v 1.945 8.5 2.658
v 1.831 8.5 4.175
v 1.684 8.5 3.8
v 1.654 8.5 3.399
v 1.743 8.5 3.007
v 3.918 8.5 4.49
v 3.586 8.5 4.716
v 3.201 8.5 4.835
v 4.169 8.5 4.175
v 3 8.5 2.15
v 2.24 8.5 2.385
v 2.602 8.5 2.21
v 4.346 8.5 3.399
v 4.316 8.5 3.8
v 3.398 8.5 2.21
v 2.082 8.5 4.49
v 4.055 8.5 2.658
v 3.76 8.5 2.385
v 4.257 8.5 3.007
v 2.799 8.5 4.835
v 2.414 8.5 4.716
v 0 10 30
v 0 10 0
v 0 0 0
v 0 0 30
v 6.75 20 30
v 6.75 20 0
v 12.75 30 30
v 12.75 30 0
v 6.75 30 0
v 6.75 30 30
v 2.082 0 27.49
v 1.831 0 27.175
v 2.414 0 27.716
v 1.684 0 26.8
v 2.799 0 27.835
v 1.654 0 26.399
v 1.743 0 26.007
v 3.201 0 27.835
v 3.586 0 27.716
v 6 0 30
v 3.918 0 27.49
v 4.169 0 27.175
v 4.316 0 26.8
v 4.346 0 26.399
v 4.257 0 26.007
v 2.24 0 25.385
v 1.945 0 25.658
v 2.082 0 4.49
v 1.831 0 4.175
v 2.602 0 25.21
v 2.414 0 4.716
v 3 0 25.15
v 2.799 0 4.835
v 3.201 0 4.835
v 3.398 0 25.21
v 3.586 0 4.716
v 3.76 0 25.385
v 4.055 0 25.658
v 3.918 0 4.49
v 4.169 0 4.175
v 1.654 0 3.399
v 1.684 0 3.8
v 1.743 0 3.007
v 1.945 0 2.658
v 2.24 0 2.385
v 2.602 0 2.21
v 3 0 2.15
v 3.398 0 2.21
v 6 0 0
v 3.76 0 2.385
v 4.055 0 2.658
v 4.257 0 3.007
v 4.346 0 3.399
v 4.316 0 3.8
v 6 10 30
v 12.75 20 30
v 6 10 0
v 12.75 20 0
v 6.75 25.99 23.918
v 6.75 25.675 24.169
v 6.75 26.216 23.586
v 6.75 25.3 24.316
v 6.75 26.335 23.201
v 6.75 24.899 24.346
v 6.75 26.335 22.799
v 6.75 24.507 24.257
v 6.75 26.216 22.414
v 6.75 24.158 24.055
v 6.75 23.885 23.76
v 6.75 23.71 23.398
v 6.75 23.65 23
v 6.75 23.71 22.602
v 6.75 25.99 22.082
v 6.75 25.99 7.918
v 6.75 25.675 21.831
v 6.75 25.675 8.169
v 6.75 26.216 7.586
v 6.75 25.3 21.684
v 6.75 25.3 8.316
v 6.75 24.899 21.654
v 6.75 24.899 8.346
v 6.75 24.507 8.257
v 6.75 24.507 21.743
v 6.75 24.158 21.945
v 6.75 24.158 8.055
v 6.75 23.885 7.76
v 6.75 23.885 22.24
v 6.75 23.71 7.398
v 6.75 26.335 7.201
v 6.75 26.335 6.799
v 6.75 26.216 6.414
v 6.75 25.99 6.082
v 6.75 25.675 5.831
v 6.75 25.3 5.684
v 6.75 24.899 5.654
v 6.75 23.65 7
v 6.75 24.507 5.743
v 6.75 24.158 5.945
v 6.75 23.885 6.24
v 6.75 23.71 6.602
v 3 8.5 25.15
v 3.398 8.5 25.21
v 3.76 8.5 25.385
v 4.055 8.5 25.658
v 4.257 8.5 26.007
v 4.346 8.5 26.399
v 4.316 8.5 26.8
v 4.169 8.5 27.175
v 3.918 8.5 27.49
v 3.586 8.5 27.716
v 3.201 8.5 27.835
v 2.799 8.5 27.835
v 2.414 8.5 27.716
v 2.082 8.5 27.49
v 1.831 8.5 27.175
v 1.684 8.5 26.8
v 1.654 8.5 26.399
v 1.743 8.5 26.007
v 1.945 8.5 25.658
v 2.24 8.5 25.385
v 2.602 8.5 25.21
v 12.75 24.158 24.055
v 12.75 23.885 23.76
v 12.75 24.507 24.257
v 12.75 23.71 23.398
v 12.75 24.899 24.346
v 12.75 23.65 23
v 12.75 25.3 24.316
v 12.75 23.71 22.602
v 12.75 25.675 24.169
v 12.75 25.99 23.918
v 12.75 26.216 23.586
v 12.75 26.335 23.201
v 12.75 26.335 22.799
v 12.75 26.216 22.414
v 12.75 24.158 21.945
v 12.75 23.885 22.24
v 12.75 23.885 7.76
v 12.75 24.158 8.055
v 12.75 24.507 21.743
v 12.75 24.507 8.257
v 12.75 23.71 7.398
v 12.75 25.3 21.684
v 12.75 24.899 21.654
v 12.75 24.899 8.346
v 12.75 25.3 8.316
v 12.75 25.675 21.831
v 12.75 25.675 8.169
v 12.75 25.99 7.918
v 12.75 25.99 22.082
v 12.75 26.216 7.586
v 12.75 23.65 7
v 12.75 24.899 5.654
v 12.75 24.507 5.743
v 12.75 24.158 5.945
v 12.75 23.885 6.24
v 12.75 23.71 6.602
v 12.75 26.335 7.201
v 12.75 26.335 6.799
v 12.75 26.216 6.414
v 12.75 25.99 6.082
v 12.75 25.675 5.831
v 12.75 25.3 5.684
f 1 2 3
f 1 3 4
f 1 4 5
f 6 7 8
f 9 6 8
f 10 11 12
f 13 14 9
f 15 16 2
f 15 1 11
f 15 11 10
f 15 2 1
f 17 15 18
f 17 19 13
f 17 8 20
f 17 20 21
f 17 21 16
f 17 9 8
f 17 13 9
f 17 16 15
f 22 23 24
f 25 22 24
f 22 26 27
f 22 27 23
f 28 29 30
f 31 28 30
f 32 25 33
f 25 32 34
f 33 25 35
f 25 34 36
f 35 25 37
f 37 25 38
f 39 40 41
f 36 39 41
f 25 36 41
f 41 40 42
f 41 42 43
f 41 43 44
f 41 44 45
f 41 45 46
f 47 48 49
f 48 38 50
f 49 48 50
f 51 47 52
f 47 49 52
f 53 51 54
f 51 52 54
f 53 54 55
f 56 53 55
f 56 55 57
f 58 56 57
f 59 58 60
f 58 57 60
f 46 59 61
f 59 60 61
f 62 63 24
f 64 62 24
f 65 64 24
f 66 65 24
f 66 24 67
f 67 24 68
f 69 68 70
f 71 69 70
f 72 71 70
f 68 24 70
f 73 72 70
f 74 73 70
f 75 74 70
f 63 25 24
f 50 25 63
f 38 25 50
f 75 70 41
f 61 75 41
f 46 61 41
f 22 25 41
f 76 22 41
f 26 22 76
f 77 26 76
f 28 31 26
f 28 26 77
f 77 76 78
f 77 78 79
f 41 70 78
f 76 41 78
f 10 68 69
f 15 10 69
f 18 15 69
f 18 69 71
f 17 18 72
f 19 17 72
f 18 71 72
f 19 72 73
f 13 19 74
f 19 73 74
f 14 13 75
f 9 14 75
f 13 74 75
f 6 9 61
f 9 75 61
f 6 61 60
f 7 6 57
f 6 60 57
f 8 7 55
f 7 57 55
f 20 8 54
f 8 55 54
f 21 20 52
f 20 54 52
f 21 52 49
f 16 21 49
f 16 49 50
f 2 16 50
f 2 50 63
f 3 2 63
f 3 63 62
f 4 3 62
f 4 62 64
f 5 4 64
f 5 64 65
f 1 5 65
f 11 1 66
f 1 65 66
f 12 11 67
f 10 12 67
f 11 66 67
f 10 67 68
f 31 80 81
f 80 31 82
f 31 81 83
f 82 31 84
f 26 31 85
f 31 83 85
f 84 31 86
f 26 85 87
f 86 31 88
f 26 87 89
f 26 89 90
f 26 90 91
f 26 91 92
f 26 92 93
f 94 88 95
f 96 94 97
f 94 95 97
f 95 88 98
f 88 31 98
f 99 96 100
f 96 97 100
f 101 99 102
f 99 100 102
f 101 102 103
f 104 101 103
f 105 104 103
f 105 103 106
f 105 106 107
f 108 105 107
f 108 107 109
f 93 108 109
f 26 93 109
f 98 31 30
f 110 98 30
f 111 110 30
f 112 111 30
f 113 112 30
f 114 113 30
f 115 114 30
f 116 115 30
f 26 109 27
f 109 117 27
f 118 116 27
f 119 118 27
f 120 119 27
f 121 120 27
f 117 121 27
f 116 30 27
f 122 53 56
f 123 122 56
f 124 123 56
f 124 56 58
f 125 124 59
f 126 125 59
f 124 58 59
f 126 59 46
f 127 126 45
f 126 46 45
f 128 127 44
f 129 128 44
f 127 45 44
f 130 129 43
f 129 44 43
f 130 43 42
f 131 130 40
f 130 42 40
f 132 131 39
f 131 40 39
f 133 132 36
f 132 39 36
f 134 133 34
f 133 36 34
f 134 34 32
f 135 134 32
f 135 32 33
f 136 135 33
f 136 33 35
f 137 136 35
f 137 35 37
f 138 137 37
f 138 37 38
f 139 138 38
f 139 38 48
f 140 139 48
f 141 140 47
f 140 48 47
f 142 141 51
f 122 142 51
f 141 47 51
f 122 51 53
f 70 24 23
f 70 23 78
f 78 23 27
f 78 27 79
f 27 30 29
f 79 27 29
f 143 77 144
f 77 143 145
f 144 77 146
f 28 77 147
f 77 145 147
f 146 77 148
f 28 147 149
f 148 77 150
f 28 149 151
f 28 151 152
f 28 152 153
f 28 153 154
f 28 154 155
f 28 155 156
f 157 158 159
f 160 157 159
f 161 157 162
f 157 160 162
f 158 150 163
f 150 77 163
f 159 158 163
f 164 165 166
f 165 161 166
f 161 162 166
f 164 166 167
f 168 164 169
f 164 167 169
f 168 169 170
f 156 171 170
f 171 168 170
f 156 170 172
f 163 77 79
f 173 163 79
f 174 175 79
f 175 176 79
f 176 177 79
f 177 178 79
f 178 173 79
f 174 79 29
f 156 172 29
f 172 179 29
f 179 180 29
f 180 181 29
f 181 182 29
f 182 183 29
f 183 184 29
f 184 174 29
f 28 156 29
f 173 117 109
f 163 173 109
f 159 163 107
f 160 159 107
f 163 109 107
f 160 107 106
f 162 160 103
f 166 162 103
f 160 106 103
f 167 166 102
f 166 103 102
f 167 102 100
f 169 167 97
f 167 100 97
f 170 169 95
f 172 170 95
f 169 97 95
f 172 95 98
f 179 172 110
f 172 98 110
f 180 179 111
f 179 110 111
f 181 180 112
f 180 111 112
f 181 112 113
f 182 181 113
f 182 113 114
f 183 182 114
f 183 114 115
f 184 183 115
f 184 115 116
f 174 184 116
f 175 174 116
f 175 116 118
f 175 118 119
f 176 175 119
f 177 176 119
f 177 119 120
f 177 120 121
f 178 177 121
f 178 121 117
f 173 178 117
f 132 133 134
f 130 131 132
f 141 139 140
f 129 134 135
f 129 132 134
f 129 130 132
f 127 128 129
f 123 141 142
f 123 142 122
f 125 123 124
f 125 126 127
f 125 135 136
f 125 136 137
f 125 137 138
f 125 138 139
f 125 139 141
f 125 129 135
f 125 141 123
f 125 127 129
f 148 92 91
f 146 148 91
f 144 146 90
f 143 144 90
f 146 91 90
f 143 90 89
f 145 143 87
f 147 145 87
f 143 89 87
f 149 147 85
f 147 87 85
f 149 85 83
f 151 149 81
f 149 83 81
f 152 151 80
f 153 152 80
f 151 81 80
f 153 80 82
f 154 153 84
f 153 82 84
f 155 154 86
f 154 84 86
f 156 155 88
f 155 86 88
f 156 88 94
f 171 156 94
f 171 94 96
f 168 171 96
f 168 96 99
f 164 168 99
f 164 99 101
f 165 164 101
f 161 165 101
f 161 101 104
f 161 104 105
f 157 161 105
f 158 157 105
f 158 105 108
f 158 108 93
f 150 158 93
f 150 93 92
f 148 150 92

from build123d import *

# Parameters (mm, degrees)
BOSS_EXTRUDE1_DEPTH = 30
SKETCH2_R           = 1.35
CUT_EXTRUDE1_DEPTH  = 8.5
CUT_EXTRUDE2_REACH  = 44.96
SKETCH3_R           = 1.35


with BuildPart() as part:
    # Sketch1 → Boss-Extrude1 (new body)
    with BuildSketch(Plane.XY):
        Polygon((0, 0), (6, 0), (6, 10), (12.75, 20), (12.75, 30), (6.75, 30), (6.75, 20), (0, 10), align=None)
    extrude(amount=BOSS_EXTRUDE1_DEPTH)

    # Sketch2 → Cut-Extrude1 (cut)
    with BuildSketch(Plane.XZ):
        with Locations(Location((3, 26.5, 0), (0, 0, 270))):
            Circle(SKETCH2_R)
        with Locations(Location((3, 3.5, 0), (0, 0, 270))):
            Circle(SKETCH2_R)
    extrude(amount=-CUT_EXTRUDE1_DEPTH, mode=Mode.SUBTRACT)

    # Sketch3 → Cut-Extrude2 (cut, up to next)
    with BuildSketch(Plane.ZY.offset(-6.75), mode=Mode.PRIVATE) as cut_extrude2_sk1:
        with Locations(Location((7, 25, 0), (0, 0, 270))):
            Circle(SKETCH3_R)
    cut_extrude2_tool1 = extrude(cut_extrude2_sk1.sketch, amount=-CUT_EXTRUDE2_REACH, mode=Mode.PRIVATE) & part.part
    # Sketch3 → Cut-Extrude2 (cut, up to next)
    with BuildSketch(Plane.ZY.offset(-6.75), mode=Mode.PRIVATE) as cut_extrude2_sk2:
        with Locations(Location((23, 25, 0), (0, 0, 270))):
            Circle(SKETCH3_R)
    cut_extrude2_tool2 = extrude(cut_extrude2_sk2.sketch, amount=-CUT_EXTRUDE2_REACH, mode=Mode.PRIVATE) & part.part
    add(cut_extrude2_tool1.solids().sort_by_distance((6.75, 25, 7))[0], mode=Mode.SUBTRACT)
    add(cut_extrude2_tool2.solids().sort_by_distance((6.75, 25, 23))[0], mode=Mode.SUBTRACT)


solid = part.part
